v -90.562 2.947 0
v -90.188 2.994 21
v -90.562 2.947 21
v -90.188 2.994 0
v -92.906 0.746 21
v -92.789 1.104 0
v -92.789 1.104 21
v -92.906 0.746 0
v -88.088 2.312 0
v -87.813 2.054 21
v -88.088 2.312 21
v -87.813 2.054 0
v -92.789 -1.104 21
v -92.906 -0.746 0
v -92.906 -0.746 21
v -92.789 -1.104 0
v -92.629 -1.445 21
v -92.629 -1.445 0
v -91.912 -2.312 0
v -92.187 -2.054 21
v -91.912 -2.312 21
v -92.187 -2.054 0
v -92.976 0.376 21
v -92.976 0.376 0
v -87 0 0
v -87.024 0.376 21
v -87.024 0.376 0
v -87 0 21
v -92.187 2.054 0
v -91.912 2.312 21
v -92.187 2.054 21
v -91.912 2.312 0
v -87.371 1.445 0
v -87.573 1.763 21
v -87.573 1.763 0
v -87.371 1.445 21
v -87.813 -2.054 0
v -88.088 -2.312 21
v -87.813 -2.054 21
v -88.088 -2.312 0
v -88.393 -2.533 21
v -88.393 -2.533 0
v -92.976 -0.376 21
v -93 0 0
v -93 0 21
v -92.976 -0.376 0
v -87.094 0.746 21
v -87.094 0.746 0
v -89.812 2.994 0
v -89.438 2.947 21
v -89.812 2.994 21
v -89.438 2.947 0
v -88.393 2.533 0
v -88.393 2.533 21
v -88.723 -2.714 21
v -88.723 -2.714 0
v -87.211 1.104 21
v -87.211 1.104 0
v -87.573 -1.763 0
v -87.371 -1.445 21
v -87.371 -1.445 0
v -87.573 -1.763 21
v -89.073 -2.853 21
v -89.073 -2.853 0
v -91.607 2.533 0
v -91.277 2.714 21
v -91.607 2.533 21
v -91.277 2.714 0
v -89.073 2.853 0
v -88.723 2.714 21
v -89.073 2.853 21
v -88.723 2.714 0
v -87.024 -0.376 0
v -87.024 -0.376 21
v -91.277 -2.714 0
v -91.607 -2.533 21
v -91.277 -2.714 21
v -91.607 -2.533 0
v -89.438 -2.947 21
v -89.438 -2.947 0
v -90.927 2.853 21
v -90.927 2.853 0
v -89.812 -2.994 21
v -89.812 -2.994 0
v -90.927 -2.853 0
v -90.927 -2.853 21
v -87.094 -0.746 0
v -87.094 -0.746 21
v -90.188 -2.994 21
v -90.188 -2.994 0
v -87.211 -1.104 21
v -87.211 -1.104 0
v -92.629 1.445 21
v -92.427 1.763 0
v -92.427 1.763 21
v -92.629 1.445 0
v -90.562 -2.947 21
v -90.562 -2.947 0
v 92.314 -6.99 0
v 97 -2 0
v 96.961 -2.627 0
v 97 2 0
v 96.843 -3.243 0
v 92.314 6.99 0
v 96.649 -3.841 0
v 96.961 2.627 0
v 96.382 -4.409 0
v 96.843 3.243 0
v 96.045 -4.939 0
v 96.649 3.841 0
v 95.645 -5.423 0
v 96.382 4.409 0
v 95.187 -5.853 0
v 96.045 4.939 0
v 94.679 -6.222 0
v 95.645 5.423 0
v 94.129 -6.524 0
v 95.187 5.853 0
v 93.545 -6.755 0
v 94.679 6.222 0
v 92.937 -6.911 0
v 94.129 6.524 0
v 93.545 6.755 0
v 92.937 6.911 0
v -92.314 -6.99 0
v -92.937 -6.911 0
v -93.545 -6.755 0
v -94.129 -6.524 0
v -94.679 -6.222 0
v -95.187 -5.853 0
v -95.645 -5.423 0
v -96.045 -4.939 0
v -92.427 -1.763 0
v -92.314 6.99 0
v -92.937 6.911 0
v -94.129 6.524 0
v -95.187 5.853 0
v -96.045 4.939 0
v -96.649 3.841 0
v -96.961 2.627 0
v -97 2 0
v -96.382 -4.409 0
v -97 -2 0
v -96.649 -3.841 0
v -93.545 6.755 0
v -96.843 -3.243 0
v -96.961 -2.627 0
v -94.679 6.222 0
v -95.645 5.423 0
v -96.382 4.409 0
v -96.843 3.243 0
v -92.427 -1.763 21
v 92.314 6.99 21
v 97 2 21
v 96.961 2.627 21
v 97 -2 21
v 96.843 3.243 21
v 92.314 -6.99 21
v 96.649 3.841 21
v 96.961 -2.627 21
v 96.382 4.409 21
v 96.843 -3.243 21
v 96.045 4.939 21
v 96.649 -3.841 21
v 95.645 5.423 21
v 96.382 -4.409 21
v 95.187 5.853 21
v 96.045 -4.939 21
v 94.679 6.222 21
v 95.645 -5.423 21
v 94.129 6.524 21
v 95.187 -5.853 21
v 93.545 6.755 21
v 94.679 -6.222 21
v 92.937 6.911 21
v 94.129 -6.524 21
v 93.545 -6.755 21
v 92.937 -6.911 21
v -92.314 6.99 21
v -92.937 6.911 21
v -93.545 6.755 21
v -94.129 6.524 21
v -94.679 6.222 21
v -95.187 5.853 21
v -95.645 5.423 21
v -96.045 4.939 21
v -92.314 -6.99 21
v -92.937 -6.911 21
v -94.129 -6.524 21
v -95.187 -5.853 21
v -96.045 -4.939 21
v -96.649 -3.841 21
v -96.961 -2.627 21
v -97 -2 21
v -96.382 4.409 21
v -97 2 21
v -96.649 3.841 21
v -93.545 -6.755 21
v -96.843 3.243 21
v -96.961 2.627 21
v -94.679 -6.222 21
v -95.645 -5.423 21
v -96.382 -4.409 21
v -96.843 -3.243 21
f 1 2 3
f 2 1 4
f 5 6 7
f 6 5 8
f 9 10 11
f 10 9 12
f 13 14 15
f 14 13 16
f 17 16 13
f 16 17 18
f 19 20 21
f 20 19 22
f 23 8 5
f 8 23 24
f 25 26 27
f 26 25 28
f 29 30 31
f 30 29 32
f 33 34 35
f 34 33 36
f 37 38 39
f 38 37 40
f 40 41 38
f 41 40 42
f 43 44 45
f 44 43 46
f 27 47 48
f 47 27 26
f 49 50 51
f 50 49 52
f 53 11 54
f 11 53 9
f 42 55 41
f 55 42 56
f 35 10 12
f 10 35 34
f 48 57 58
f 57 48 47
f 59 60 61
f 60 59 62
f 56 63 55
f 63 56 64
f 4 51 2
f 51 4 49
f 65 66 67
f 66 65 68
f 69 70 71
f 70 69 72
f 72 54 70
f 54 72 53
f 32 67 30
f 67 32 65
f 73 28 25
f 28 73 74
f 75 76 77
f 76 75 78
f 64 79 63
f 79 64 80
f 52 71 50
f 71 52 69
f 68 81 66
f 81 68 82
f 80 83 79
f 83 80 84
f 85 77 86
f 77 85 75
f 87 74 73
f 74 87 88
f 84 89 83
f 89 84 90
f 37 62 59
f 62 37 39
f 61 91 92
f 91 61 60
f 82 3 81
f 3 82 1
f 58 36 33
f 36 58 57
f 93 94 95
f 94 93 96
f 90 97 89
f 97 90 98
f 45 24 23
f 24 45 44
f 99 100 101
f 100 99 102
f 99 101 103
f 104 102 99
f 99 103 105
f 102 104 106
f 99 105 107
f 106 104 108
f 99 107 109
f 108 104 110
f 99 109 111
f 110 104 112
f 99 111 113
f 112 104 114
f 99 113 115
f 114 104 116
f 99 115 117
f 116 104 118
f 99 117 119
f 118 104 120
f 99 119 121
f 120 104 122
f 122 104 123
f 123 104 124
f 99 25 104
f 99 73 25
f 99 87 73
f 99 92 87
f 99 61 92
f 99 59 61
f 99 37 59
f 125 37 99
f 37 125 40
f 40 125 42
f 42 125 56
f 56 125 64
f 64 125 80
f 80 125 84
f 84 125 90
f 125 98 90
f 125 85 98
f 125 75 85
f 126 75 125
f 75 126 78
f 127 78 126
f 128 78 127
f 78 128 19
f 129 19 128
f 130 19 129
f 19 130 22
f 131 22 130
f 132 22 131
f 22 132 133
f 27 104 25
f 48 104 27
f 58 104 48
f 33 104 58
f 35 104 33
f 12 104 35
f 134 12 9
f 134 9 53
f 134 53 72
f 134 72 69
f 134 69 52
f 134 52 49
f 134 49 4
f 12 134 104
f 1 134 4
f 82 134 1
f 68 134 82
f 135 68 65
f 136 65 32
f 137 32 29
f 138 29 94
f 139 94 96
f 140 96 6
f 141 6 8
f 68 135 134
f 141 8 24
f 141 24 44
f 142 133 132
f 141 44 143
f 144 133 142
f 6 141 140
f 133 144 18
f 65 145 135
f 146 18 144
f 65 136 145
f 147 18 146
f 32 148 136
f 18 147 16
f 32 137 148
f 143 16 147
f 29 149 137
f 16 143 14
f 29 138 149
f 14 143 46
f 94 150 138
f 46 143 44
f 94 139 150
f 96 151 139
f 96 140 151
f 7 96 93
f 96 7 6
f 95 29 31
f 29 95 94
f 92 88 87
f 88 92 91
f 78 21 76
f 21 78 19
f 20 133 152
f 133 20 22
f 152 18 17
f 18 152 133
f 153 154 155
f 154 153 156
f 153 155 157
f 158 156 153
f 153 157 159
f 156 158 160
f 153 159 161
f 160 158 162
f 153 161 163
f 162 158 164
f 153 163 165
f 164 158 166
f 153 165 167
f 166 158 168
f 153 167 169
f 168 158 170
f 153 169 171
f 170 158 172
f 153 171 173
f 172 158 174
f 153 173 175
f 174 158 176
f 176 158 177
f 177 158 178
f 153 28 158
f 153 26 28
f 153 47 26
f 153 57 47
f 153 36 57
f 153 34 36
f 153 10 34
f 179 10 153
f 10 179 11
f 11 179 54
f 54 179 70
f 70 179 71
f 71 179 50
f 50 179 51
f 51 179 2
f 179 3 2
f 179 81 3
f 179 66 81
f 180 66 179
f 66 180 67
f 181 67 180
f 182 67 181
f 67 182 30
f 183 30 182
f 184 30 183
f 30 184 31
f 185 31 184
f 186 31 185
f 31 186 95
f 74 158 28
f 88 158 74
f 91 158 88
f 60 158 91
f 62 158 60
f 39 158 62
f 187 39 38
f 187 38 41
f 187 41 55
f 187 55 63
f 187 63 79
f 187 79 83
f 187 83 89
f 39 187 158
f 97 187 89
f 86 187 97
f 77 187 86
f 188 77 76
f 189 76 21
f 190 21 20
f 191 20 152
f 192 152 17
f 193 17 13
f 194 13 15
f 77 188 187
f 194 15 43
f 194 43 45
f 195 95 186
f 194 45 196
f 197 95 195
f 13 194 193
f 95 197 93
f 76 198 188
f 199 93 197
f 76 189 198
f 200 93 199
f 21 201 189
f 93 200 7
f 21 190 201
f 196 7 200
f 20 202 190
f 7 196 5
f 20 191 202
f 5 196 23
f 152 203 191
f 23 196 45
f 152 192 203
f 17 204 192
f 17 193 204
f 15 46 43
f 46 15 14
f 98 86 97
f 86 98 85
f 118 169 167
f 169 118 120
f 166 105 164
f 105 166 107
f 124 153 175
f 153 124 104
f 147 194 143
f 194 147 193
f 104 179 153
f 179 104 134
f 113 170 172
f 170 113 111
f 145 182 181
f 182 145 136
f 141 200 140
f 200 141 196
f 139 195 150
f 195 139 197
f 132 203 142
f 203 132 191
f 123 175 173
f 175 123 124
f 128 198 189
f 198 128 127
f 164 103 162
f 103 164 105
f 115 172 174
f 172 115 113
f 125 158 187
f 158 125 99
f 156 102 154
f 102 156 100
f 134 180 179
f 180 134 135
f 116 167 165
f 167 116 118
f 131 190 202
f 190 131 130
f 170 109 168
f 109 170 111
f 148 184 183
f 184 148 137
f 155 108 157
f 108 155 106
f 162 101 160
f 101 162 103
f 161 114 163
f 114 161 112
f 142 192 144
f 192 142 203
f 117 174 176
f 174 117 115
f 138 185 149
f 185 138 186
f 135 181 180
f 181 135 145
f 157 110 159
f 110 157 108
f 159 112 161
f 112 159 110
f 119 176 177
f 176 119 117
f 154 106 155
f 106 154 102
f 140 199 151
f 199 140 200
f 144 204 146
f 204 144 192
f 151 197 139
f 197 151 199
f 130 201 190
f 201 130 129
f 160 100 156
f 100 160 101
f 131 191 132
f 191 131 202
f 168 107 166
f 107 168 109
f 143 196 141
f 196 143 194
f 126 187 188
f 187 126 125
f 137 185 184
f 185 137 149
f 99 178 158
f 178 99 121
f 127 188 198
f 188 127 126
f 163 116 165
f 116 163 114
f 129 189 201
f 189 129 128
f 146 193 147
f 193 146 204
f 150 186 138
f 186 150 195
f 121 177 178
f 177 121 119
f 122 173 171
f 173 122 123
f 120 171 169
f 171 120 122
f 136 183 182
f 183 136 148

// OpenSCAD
$fn = 50;


difference() {
	union() {
		hull() {
			translate(v = [-92.0000000000, 2.0000000000, 0]) {
				cylinder(h = 21, r = 5);
			}
			translate(v = [92.0000000000, 2.0000000000, 0]) {
				cylinder(h = 21, r = 5);
			}
			translate(v = [-92.0000000000, -2.0000000000, 0]) {
				cylinder(h = 21, r = 5);
			}
			translate(v = [92.0000000000, -2.0000000000, 0]) {
				cylinder(h = 21, r = 5);
			}
		}
	}
	union() {
		translate(v = [-90.0000000000, 0.0000000000, 0]) {
			cylinder(h = 21, r = 3.0000000000);
		}
		translate(v = [-90.0000000000, 0.0000000000, 0]) {
			cylinder(h = 21, r = 1.5000000000);
		}
		translate(v = [-90.0000000000, 0.0000000000, 0]) {
			cylinder(h = 21, r = 1.5000000000);
		}
		translate(v = [-90.0000000000, 0.0000000000, 0]) {
			cylinder(h = 21, r = 1.5000000000);
		}
	}
}
